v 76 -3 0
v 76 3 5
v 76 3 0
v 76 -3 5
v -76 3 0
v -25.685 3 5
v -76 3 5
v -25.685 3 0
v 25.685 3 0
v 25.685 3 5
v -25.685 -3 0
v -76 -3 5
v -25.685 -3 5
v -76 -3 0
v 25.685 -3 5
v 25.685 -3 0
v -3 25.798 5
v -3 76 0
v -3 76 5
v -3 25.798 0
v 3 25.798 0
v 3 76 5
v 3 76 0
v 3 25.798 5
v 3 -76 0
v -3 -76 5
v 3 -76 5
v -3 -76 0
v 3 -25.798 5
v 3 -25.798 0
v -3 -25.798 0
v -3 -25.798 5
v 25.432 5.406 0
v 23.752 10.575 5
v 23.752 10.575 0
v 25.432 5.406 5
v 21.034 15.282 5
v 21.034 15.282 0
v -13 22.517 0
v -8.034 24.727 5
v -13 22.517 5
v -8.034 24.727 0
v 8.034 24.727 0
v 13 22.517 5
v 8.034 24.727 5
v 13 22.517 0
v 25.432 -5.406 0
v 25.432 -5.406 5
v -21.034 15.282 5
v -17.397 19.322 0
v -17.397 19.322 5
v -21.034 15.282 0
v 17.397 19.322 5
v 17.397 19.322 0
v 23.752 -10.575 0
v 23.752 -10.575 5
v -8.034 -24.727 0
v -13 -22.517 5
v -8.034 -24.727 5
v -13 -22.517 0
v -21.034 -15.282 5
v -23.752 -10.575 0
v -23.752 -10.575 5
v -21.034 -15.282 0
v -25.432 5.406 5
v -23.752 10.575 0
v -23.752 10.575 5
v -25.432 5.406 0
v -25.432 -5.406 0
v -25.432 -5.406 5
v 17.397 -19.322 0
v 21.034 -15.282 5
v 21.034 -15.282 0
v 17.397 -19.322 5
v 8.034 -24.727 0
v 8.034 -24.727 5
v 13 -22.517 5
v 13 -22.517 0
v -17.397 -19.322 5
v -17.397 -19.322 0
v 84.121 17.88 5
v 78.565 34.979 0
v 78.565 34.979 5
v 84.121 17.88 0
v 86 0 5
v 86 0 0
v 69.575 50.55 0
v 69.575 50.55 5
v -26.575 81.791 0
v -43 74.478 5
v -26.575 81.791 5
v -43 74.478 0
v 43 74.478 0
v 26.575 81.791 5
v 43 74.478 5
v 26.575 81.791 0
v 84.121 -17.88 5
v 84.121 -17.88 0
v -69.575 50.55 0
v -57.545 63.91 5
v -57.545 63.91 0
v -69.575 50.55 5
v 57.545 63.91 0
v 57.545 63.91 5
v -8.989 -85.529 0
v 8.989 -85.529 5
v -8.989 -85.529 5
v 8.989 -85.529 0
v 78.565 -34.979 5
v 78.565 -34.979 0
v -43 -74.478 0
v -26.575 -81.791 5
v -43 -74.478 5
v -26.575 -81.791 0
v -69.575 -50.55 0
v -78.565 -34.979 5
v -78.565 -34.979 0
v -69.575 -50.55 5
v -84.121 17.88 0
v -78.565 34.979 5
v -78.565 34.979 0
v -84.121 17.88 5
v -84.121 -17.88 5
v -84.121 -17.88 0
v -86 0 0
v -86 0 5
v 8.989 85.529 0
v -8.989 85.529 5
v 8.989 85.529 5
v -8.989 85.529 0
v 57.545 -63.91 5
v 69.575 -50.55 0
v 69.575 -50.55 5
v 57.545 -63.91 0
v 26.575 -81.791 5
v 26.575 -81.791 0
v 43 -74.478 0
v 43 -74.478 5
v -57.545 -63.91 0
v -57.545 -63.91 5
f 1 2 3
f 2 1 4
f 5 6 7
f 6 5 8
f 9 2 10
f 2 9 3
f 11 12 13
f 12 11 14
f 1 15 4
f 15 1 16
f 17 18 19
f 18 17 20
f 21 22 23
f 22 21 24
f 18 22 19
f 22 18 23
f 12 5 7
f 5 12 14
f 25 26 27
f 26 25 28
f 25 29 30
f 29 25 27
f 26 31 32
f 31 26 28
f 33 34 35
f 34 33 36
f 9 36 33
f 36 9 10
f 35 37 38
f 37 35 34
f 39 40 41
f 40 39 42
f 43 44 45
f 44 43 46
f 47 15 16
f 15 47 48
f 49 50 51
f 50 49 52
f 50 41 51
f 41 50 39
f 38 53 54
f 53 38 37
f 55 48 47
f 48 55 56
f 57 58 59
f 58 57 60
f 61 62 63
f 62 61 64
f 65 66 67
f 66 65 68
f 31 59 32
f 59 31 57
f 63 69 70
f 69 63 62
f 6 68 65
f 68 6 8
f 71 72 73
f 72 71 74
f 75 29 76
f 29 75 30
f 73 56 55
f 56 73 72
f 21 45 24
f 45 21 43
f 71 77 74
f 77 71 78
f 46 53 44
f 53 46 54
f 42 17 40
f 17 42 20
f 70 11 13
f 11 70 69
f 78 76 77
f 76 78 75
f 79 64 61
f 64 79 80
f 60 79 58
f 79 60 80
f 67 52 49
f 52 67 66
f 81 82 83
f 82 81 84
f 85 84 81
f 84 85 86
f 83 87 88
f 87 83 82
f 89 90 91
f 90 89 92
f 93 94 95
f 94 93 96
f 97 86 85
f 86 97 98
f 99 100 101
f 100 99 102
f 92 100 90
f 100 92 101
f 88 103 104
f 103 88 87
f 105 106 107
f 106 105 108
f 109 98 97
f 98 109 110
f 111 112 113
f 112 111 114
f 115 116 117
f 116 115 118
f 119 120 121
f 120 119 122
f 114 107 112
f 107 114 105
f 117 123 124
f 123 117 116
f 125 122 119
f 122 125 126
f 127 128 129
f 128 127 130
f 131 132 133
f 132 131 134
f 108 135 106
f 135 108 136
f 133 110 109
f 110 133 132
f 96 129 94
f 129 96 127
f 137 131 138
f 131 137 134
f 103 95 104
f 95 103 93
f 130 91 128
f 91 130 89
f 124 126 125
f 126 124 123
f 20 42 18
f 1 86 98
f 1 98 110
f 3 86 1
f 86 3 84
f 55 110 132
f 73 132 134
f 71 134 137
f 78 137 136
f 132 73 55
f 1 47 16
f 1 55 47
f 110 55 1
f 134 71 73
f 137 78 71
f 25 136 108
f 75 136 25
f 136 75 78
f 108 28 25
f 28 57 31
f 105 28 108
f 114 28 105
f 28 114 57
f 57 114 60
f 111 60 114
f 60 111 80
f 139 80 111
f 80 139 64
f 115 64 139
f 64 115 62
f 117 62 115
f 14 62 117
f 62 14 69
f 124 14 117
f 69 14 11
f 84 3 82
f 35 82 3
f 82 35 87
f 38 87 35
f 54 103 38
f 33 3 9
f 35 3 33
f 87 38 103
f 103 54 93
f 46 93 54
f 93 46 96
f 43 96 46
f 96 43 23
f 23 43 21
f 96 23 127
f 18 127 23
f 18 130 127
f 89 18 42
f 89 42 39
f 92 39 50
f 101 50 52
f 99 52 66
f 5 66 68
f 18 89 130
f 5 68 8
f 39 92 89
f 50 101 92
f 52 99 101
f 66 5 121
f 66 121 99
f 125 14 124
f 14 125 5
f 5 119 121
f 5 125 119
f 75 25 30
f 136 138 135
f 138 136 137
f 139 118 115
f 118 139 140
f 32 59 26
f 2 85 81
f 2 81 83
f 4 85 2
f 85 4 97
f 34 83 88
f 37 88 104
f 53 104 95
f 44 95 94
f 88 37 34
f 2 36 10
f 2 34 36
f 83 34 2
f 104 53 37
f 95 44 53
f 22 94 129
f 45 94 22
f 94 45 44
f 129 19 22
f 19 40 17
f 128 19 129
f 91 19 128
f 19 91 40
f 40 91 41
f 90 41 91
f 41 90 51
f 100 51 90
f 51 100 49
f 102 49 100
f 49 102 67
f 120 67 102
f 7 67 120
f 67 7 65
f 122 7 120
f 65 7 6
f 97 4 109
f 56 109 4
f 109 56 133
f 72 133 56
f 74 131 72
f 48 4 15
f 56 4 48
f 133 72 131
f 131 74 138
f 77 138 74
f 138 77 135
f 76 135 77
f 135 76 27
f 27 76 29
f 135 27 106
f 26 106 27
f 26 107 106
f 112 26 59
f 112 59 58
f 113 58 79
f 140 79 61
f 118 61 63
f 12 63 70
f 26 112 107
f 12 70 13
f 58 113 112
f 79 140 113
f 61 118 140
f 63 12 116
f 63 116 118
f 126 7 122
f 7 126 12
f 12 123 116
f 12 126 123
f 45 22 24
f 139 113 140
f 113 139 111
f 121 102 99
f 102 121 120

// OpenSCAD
// A jig to slide down over the top of a fin assembly to hold the body against it
module rocket_fin_clamp(
    // Parameters of rocket
    tube_diameter,
    fin_thickness,
    fin_length,
    num_fins=4,
    // Basic Dimensions
    thickness=5,
    // Tolerances/offsets
    outer_offset=10,
    inner_offset=1,
    fin_side_offset=2,
    fin_outer_offset=1,
    fillet_radius=2,
) {
    // Intermediate vars
    inner_radius = (tube_diameter / 2) + inner_offset;
    fin_cutout_len = fin_length - inner_offset + fin_outer_offset;
    fin_cutout_width = fin_thickness + (fin_outer_offset * 2);

    difference() {
        // Basic cylinder
        cylinder(
            r = inner_radius + fin_cutout_len + outer_offset,
            h = thickness
        );

        union() {
            // Inner hole
            translate([0, 0, (thickness / 2)])
            cylinder(
                r = inner_radius,
                h = thickness + 2,
                center = true
            );

            for (i = [0:num_fins]) {
                rotate([0, 0, (360 / num_fins) * i])
                translate([0, -(fin_cutout_width / 2), -1])
                cube([
                        fin_cutout_len + inner_radius,
                        fin_cutout_width,
                        thickness + 2,
                    ]
                    /* center = true */
                );
            };
        };
    };
}

rocket_fin_clamp(50, 4, 50);
